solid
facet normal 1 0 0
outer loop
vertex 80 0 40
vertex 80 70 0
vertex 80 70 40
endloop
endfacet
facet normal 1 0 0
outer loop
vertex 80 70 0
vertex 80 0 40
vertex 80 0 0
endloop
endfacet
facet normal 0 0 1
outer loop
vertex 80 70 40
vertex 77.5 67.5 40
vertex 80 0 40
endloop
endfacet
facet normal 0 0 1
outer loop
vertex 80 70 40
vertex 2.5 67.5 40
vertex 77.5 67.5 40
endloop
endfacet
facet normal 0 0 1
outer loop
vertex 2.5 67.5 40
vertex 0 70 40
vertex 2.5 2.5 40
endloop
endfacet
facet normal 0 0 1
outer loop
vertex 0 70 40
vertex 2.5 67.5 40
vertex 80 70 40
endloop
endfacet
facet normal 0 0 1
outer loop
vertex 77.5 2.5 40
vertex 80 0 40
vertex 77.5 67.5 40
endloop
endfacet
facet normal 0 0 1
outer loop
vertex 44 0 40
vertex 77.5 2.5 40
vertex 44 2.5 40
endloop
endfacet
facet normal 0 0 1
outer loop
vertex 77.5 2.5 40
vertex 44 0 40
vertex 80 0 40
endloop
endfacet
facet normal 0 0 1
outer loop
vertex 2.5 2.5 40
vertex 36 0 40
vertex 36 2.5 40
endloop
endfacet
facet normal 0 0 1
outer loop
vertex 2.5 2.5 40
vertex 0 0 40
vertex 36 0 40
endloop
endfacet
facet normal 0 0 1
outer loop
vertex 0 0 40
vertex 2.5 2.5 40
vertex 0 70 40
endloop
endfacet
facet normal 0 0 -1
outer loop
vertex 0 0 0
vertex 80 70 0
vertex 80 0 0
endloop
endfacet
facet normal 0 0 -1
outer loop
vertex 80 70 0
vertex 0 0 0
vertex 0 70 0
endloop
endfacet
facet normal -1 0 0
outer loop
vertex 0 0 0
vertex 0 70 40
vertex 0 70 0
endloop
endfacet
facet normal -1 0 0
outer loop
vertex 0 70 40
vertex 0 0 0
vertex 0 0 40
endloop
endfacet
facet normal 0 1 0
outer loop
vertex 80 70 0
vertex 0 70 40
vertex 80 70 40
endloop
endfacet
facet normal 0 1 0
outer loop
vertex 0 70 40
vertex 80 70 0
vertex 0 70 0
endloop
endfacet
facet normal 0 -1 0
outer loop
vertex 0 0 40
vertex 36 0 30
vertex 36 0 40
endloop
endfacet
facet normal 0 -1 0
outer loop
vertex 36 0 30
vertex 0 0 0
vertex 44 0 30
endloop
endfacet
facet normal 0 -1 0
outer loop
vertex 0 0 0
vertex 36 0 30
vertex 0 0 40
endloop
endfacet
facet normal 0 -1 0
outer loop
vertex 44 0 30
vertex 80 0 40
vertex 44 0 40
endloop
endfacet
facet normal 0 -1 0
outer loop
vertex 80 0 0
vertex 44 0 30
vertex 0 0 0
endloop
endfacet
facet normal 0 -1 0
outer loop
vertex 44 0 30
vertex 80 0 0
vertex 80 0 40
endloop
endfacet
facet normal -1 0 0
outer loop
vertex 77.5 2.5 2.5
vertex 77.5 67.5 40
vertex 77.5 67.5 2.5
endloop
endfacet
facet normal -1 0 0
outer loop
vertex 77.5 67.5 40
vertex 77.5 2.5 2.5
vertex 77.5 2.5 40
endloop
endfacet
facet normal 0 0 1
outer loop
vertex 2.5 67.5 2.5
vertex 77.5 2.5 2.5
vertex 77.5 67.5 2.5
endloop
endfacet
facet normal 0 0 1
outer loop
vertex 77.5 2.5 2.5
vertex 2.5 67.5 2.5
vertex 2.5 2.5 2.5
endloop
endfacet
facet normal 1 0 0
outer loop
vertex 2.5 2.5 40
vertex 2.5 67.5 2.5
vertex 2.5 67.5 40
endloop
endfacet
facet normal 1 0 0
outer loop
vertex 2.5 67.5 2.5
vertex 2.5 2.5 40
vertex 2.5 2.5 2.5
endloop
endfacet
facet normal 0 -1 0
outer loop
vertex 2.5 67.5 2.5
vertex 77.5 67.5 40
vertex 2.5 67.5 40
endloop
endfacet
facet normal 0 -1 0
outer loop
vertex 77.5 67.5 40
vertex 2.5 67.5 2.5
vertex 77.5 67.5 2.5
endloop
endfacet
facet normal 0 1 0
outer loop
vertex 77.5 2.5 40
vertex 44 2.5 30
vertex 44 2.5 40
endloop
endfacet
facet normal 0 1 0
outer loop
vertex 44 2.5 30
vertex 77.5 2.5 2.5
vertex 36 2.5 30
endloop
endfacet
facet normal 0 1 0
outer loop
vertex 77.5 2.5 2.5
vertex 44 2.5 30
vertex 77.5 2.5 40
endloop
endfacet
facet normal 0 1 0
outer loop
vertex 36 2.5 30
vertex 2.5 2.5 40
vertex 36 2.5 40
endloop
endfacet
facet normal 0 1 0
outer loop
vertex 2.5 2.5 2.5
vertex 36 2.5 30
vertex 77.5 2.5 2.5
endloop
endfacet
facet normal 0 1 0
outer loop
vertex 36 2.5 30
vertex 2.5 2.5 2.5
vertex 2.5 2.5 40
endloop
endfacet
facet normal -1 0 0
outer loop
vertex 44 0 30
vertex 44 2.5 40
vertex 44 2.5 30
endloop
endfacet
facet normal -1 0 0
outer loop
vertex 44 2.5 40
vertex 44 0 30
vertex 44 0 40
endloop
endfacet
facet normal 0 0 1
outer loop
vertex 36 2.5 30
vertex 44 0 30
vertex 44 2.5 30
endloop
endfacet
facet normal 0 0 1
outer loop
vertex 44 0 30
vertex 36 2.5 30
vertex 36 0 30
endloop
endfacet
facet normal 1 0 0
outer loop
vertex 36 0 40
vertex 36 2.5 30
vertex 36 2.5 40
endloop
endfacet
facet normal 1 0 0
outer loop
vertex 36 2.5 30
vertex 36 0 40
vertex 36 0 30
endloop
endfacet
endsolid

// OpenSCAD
$fn = 32;

// ----------------------------------------------------------------------
// Enclosure box: notch enclosure
// ----------------------------------------------------------------------

// --- parameters (mm) ---
box_l = 80;               // outer length, X
box_w = 70;               // outer width, Y
box_h = 40;               // outer height
wall_t = 2.5;             // wall thickness
notch_w = 8;              // cable notch width
notch_h = 10;             // cable notch height

inner_h = box_h - wall_t;  // cavity depth
boss_h = inner_h - 2;  // corner boss height

difference() {
  union() {
    difference() {
      cube([box_l, box_w, box_h]);
      translate([wall_t, wall_t, wall_t])
        cube([box_l - 2 * wall_t, box_w - 2 * wall_t, box_h]);
    }
  }
  translate([box_l / 2 - notch_w / 2, -1, box_h - notch_h])
    cube([notch_w, wall_t + 2, notch_h + 1]);
}
